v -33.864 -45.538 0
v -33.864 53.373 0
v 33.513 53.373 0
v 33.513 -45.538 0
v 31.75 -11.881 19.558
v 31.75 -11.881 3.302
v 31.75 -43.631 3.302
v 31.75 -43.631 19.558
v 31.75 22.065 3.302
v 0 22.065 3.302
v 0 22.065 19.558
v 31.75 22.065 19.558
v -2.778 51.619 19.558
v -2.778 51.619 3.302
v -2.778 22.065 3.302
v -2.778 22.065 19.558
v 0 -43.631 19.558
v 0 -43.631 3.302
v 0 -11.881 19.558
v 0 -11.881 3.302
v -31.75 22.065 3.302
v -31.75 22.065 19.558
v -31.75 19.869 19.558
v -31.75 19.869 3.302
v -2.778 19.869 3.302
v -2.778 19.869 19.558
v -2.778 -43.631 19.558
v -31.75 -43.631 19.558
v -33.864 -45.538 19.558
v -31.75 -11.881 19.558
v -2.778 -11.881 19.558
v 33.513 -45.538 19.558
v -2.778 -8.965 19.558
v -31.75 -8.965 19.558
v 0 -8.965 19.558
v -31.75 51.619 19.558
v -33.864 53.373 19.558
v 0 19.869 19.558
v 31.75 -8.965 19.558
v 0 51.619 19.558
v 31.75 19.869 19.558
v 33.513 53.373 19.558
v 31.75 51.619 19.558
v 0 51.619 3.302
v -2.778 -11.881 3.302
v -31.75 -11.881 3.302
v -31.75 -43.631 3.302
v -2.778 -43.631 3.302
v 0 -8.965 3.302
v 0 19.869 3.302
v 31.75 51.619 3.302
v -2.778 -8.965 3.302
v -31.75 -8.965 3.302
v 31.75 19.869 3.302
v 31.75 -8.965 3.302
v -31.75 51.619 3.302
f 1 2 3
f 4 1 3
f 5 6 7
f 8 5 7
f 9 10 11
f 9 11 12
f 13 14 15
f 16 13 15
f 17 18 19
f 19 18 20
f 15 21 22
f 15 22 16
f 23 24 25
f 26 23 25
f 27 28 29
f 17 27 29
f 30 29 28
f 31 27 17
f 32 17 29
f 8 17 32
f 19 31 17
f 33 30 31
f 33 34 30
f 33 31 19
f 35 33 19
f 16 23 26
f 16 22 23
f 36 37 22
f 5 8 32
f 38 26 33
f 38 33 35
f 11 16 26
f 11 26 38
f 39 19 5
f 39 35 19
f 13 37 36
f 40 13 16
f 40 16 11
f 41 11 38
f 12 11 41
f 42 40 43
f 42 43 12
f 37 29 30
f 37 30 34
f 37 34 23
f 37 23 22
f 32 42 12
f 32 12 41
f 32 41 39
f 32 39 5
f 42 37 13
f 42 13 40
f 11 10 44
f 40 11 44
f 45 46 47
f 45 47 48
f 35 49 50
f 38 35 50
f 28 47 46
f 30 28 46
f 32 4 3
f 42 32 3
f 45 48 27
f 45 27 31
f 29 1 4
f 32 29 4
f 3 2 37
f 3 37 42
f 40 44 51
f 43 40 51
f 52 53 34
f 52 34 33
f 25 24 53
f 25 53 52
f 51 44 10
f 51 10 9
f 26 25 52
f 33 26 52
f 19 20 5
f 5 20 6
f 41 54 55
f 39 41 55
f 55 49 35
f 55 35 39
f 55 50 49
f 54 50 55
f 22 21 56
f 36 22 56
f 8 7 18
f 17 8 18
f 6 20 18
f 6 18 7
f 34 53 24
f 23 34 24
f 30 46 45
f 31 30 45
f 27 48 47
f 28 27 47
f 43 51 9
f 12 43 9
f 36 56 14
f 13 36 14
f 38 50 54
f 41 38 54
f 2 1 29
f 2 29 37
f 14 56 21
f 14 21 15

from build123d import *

# Parameters (mm, degrees)
F0_W     = 67.3768445849
F0_H     = 98.9107750356
F0_W_2   = 2.7784528211
F0_H_2   = 29.5537686782
F0_H_3   = 2.1962313218
F0_H_4   = 28.8333376633
F0_W_3   = 28.9715471789
F0_W_4   = 31.75
F0_H_5   = 2.9166623367
F0_H_6   = 31.75
F1_DEPTH = 19.558
F2_DEPTH = 3.302


with BuildPart() as f1:
    # F0 (on Top) → F1 (new body)
    with BuildSketch(Plane.XY):
        with Locations((-0.175267458, 3.9172600955)):
            Rectangle(F0_W, F0_H)
        Polygon((-31.75, 22.0649391413), (-31.75, 51.6187078194), (-2.7784528211, 51.6187078194), (0, 51.6187078194), (31.75, 51.6187078194), (31.75, 22.0649391413), (31.75, 19.8687078194), (31.75, -8.9646298438), (31.75, -11.8812921806), (31.75, -43.6312921806), (0, -43.6312921806), (-2.7784528211, -43.6312921806), (-31.75, -43.6312921806), (-31.75, -11.8812921806), (-31.75, -8.9646298438), (-31.75, 19.8687078194), align=None, mode=Mode.SUBTRACT)
        with Locations((-1.3892264105, 36.8418234804)):
            Rectangle(F0_W_2, F0_H_2)
        with Locations((-1.3892264105, 20.9668234804)):
            Rectangle(F0_W_2, F0_H_3)
        with Locations((-1.3892264105, 5.4520389878)):
            Rectangle(F0_W_2, F0_H_4)
        with Locations((-17.2642264105, 20.9668234804)):
            Rectangle(F0_W_3, F0_H_3)
        with Locations((15.875, 20.9668234804)):
            Rectangle(F0_W_4, F0_H_3)
        with Locations((-17.2642264105, -10.4229610122)):
            Rectangle(F0_W_3, F0_H_5)
        with Locations((-1.3892264105, -10.4229610122)):
            Rectangle(F0_W_2, F0_H_5)
        with Locations((-1.3892264105, -27.7562921806)):
            Rectangle(F0_W_2, F0_H_6)
        with Locations((15.875, -10.4229610122)):
            Rectangle(F0_W_4, F0_H_5)
    extrude(amount=F1_DEPTH)

    # F0 (on Top) → F2 (join)
    with BuildSketch(Plane.XY):
        with Locations((-0.175267458, 3.9172600955)):
            Rectangle(F0_W, F0_H)
        Polygon((-31.75, 22.0649391413), (-31.75, 51.6187078194), (-2.7784528211, 51.6187078194), (0, 51.6187078194), (31.75, 51.6187078194), (31.75, 22.0649391413), (31.75, 19.8687078194), (31.75, -8.9646298438), (31.75, -11.8812921806), (31.75, -43.6312921806), (0, -43.6312921806), (-2.7784528211, -43.6312921806), (-31.75, -43.6312921806), (-31.75, -11.8812921806), (-31.75, -8.9646298438), (-31.75, 19.8687078194), align=None, mode=Mode.SUBTRACT)
        with Locations((15.875, 36.8418234804)):
            Rectangle(F0_W_4, F0_H_2)
        with Locations((15.875, 5.4520389878)):
            Rectangle(F0_W_4, F0_H_4)
        with Locations((-17.2642264105, 36.8418234804)):
            Rectangle(F0_W_3, F0_H_2)
        with Locations((-17.2642264105, 5.4520389878)):
            Rectangle(F0_W_3, F0_H_4)
        with Locations((-17.2642264105, -27.7562921806)):
            Rectangle(F0_W_3, F0_H_6)
        with Locations((15.875, -27.7562921806)):
            Rectangle(F0_W_4, F0_H_6)
    extrude(amount=F2_DEPTH)


solid = f1.part
